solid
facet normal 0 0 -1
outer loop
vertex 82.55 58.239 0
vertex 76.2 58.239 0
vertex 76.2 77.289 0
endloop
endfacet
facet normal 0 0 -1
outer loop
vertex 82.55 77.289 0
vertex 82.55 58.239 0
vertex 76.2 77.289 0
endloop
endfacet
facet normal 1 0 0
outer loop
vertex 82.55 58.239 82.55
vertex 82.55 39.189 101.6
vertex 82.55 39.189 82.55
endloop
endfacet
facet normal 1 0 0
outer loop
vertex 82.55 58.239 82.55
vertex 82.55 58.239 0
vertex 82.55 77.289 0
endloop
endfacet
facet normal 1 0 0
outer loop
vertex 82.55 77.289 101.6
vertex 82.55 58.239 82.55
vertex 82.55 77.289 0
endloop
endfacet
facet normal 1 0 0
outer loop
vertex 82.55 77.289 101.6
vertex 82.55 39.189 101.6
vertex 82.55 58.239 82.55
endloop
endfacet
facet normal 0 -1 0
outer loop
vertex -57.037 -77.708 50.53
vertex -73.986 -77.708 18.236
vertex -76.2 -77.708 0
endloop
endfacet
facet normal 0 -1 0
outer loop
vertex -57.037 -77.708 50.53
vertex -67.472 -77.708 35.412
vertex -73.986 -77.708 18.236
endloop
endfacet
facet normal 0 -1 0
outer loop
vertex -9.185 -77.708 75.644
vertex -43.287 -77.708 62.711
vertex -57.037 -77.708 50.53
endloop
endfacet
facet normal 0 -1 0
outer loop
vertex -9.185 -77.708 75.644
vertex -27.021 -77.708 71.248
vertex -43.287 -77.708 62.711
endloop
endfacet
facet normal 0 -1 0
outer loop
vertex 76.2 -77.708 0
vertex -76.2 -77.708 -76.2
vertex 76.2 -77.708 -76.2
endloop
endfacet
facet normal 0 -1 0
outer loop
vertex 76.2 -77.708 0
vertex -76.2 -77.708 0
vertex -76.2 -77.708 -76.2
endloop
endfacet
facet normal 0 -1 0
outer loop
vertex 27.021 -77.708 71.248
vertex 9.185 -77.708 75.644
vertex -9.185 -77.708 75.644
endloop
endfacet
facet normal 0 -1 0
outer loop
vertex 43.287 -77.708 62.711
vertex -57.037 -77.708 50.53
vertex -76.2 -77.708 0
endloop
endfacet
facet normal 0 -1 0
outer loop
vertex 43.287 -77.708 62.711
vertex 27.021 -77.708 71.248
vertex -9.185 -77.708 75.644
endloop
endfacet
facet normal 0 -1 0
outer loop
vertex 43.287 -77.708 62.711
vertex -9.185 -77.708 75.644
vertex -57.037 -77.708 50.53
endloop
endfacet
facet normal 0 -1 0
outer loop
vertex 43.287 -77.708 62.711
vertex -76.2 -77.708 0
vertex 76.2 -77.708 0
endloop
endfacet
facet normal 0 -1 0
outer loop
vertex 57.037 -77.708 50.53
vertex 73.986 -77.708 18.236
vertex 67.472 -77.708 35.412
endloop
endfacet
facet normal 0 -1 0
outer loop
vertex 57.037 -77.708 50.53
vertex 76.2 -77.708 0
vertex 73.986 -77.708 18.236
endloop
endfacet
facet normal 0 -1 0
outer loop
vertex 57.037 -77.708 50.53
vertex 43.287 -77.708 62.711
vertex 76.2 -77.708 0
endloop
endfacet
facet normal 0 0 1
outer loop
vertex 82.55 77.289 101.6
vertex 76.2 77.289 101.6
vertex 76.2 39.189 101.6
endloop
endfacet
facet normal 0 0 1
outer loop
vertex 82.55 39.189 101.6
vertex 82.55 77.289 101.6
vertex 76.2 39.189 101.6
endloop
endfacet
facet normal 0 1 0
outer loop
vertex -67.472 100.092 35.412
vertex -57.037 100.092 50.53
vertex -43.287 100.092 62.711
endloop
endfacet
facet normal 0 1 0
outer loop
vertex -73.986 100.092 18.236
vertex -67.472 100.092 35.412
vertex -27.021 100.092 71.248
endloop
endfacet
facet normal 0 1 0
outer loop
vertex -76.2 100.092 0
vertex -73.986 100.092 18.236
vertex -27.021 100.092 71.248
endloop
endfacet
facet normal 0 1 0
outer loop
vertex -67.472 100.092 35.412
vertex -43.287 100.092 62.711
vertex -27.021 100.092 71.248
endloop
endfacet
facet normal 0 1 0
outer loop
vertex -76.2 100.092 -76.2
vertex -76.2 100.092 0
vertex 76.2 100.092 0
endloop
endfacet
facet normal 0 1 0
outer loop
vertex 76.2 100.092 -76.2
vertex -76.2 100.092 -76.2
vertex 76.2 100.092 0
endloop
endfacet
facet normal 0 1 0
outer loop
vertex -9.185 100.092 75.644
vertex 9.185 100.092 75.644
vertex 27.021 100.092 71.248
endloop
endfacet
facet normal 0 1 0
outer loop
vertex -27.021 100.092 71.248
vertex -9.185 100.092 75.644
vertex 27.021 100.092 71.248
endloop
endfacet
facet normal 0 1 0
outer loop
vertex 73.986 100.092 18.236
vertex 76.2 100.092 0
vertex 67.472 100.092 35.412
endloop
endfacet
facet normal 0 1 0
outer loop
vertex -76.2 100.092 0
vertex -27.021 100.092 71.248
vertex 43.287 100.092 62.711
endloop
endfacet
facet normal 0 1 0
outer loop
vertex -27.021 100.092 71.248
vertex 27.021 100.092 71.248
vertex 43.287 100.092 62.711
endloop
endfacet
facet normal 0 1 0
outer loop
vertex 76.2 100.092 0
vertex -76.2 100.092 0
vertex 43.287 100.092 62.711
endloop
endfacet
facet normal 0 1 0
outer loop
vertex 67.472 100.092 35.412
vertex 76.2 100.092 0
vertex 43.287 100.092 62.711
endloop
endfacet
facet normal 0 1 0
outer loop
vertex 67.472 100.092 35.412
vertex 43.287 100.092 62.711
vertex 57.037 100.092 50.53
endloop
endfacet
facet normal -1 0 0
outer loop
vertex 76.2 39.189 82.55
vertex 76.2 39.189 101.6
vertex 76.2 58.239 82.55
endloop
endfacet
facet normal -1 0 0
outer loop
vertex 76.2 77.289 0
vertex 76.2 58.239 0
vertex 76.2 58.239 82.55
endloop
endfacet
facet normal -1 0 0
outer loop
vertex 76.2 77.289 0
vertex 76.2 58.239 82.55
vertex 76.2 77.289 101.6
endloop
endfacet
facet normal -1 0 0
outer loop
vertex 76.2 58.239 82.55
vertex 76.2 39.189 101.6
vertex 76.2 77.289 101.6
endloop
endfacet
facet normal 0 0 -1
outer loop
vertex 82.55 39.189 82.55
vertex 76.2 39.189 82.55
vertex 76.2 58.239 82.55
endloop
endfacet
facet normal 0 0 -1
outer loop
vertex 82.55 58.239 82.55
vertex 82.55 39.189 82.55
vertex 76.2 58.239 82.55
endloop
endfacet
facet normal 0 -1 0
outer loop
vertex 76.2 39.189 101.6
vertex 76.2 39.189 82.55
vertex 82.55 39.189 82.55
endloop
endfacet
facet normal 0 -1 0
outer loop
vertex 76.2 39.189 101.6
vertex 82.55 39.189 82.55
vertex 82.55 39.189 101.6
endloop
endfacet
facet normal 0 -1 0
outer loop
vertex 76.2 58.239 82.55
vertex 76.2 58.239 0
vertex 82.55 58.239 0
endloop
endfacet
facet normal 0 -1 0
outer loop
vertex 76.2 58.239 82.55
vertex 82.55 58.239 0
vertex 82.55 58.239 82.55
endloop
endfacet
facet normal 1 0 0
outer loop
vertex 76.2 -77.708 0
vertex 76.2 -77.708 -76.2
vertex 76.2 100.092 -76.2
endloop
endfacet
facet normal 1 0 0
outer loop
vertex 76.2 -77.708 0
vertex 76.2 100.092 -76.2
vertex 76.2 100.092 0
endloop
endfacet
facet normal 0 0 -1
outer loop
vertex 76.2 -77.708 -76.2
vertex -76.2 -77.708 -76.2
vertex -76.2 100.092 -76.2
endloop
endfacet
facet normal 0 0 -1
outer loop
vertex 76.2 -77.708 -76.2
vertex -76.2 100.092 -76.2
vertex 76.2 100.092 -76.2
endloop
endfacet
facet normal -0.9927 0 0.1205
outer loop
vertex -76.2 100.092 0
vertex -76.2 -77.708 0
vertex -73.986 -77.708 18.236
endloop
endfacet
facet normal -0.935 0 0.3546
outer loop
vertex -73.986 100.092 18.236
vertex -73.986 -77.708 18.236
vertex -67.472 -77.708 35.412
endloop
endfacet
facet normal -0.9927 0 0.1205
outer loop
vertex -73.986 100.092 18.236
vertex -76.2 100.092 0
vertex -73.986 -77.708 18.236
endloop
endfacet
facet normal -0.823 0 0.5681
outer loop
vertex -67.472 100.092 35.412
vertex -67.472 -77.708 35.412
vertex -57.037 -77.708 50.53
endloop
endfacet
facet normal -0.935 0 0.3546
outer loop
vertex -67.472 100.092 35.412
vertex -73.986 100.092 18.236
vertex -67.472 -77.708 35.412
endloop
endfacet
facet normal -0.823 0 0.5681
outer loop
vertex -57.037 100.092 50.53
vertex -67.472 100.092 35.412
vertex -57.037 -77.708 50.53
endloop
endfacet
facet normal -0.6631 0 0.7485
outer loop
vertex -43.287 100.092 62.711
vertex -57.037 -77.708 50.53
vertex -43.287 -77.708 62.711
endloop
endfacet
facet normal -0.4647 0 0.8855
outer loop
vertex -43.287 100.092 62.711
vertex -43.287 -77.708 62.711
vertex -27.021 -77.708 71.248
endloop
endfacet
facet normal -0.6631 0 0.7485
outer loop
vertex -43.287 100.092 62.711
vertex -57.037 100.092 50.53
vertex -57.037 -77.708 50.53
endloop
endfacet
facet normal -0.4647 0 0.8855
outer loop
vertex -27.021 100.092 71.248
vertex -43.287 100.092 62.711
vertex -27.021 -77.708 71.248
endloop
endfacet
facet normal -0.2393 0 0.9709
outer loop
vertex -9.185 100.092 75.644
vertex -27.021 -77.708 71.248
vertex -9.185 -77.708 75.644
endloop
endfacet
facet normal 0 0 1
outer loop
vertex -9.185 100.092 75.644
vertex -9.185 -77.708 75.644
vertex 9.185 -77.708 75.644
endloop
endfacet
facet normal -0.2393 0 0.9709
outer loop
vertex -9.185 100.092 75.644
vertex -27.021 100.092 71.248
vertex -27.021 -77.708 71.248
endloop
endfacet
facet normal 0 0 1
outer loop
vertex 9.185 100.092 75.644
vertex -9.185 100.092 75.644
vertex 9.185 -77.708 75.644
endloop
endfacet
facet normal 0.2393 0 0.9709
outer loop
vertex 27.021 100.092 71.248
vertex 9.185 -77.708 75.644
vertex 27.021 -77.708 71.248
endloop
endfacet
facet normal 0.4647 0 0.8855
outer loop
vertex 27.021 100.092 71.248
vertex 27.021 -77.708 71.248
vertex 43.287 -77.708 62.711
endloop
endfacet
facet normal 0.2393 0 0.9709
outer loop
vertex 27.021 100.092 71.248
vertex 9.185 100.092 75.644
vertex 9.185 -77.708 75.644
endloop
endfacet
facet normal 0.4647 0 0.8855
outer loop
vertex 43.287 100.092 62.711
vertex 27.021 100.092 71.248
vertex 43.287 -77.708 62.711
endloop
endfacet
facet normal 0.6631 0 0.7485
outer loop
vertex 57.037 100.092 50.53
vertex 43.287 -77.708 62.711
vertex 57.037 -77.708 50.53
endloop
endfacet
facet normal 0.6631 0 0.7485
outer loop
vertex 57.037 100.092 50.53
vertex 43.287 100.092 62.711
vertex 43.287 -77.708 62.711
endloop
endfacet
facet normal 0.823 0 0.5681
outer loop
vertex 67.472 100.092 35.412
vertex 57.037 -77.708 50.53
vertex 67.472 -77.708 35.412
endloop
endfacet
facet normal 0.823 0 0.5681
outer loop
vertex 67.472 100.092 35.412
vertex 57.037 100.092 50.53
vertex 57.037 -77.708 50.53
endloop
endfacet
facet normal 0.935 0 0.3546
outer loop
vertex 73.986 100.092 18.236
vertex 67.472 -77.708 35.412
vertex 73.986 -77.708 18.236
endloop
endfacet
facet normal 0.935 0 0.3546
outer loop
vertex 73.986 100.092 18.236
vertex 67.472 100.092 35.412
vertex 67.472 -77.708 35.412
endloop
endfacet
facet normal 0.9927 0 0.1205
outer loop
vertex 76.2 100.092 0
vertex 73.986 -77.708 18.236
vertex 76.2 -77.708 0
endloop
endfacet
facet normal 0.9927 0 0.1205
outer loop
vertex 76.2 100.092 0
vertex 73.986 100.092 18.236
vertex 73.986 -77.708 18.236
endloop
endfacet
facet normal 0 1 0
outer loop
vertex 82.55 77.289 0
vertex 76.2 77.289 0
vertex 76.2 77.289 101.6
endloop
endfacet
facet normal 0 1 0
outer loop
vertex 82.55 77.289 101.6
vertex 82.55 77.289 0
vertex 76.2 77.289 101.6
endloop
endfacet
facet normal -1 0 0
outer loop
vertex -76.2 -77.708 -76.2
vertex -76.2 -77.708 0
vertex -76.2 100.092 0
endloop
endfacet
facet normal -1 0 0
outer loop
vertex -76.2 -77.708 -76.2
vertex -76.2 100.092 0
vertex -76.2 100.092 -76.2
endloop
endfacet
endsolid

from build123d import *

# Parameters (mm, degrees)
F0_W     = 177.8
F0_H     = 76.2
F3_DEPTH = 177.8
F4_W     = 19.05
F4_H     = 19.05
F4_H_2   = 82.55
F5_DEPTH = 6.35


with BuildPart() as f1:
    # F0 (on Right) → F1 (revolve)
    with BuildSketch(Plane.YZ):
        with Locations((11.1915917635, 38.1)):
            Rectangle(F0_W, F0_H)
    revolve(axis=Axis((0, 11.1915917635, 0), (0, 1, 0)))

    # F2 (on face) → F3 (join)
    with BuildSketch(Plane.XZ.offset(77.7084082365)):
        with BuildLine():
            Line((0, -76.2), (0, 0))
            Line((0, 0), (-76.2, 0))
            ThreePointArc((-76.2, 0), (-53.8815367264, -53.8815367264), (0, -76.2))
        make_face()
        with BuildLine():
            Line((76.2, 0), (0, 0))
            Line((0, 0), (0, -76.2))
            ThreePointArc((0, -76.2), (53.8815367264, -53.8815367264), (76.2, 0))
        make_face()
        with BuildLine():
            Line((76.2, -76.2), (76.2, 0))
            ThreePointArc((76.2, 0), (53.8815367264, -53.8815367264), (0, -76.2))
            Line((0, -76.2), (76.2, -76.2))
        make_face()
        with BuildLine():
            Line((-76.2, -76.2), (0, -76.2))
            ThreePointArc((0, -76.2), (-53.8815367264, -53.8815367264), (-76.2, 0))
            Line((-76.2, 0), (-76.2, -76.2))
        make_face()
    extrude(amount=-F3_DEPTH)


with BuildPart() as f5:
    # F4 (on face) → F5 (new body)
    with BuildSketch(Plane.YZ.offset(76.2)):
        with Locations((48.7139810562, 92.075)):
            Rectangle(F4_W, F4_H)
        with Locations((67.7639810562, 92.075)):
            Rectangle(F4_W, F4_H)
        with Locations((67.7639810562, 41.275)):
            Rectangle(F4_W, F4_H_2)
    extrude(amount=F5_DEPTH)


solid = Compound([f1.part, f5.part])
